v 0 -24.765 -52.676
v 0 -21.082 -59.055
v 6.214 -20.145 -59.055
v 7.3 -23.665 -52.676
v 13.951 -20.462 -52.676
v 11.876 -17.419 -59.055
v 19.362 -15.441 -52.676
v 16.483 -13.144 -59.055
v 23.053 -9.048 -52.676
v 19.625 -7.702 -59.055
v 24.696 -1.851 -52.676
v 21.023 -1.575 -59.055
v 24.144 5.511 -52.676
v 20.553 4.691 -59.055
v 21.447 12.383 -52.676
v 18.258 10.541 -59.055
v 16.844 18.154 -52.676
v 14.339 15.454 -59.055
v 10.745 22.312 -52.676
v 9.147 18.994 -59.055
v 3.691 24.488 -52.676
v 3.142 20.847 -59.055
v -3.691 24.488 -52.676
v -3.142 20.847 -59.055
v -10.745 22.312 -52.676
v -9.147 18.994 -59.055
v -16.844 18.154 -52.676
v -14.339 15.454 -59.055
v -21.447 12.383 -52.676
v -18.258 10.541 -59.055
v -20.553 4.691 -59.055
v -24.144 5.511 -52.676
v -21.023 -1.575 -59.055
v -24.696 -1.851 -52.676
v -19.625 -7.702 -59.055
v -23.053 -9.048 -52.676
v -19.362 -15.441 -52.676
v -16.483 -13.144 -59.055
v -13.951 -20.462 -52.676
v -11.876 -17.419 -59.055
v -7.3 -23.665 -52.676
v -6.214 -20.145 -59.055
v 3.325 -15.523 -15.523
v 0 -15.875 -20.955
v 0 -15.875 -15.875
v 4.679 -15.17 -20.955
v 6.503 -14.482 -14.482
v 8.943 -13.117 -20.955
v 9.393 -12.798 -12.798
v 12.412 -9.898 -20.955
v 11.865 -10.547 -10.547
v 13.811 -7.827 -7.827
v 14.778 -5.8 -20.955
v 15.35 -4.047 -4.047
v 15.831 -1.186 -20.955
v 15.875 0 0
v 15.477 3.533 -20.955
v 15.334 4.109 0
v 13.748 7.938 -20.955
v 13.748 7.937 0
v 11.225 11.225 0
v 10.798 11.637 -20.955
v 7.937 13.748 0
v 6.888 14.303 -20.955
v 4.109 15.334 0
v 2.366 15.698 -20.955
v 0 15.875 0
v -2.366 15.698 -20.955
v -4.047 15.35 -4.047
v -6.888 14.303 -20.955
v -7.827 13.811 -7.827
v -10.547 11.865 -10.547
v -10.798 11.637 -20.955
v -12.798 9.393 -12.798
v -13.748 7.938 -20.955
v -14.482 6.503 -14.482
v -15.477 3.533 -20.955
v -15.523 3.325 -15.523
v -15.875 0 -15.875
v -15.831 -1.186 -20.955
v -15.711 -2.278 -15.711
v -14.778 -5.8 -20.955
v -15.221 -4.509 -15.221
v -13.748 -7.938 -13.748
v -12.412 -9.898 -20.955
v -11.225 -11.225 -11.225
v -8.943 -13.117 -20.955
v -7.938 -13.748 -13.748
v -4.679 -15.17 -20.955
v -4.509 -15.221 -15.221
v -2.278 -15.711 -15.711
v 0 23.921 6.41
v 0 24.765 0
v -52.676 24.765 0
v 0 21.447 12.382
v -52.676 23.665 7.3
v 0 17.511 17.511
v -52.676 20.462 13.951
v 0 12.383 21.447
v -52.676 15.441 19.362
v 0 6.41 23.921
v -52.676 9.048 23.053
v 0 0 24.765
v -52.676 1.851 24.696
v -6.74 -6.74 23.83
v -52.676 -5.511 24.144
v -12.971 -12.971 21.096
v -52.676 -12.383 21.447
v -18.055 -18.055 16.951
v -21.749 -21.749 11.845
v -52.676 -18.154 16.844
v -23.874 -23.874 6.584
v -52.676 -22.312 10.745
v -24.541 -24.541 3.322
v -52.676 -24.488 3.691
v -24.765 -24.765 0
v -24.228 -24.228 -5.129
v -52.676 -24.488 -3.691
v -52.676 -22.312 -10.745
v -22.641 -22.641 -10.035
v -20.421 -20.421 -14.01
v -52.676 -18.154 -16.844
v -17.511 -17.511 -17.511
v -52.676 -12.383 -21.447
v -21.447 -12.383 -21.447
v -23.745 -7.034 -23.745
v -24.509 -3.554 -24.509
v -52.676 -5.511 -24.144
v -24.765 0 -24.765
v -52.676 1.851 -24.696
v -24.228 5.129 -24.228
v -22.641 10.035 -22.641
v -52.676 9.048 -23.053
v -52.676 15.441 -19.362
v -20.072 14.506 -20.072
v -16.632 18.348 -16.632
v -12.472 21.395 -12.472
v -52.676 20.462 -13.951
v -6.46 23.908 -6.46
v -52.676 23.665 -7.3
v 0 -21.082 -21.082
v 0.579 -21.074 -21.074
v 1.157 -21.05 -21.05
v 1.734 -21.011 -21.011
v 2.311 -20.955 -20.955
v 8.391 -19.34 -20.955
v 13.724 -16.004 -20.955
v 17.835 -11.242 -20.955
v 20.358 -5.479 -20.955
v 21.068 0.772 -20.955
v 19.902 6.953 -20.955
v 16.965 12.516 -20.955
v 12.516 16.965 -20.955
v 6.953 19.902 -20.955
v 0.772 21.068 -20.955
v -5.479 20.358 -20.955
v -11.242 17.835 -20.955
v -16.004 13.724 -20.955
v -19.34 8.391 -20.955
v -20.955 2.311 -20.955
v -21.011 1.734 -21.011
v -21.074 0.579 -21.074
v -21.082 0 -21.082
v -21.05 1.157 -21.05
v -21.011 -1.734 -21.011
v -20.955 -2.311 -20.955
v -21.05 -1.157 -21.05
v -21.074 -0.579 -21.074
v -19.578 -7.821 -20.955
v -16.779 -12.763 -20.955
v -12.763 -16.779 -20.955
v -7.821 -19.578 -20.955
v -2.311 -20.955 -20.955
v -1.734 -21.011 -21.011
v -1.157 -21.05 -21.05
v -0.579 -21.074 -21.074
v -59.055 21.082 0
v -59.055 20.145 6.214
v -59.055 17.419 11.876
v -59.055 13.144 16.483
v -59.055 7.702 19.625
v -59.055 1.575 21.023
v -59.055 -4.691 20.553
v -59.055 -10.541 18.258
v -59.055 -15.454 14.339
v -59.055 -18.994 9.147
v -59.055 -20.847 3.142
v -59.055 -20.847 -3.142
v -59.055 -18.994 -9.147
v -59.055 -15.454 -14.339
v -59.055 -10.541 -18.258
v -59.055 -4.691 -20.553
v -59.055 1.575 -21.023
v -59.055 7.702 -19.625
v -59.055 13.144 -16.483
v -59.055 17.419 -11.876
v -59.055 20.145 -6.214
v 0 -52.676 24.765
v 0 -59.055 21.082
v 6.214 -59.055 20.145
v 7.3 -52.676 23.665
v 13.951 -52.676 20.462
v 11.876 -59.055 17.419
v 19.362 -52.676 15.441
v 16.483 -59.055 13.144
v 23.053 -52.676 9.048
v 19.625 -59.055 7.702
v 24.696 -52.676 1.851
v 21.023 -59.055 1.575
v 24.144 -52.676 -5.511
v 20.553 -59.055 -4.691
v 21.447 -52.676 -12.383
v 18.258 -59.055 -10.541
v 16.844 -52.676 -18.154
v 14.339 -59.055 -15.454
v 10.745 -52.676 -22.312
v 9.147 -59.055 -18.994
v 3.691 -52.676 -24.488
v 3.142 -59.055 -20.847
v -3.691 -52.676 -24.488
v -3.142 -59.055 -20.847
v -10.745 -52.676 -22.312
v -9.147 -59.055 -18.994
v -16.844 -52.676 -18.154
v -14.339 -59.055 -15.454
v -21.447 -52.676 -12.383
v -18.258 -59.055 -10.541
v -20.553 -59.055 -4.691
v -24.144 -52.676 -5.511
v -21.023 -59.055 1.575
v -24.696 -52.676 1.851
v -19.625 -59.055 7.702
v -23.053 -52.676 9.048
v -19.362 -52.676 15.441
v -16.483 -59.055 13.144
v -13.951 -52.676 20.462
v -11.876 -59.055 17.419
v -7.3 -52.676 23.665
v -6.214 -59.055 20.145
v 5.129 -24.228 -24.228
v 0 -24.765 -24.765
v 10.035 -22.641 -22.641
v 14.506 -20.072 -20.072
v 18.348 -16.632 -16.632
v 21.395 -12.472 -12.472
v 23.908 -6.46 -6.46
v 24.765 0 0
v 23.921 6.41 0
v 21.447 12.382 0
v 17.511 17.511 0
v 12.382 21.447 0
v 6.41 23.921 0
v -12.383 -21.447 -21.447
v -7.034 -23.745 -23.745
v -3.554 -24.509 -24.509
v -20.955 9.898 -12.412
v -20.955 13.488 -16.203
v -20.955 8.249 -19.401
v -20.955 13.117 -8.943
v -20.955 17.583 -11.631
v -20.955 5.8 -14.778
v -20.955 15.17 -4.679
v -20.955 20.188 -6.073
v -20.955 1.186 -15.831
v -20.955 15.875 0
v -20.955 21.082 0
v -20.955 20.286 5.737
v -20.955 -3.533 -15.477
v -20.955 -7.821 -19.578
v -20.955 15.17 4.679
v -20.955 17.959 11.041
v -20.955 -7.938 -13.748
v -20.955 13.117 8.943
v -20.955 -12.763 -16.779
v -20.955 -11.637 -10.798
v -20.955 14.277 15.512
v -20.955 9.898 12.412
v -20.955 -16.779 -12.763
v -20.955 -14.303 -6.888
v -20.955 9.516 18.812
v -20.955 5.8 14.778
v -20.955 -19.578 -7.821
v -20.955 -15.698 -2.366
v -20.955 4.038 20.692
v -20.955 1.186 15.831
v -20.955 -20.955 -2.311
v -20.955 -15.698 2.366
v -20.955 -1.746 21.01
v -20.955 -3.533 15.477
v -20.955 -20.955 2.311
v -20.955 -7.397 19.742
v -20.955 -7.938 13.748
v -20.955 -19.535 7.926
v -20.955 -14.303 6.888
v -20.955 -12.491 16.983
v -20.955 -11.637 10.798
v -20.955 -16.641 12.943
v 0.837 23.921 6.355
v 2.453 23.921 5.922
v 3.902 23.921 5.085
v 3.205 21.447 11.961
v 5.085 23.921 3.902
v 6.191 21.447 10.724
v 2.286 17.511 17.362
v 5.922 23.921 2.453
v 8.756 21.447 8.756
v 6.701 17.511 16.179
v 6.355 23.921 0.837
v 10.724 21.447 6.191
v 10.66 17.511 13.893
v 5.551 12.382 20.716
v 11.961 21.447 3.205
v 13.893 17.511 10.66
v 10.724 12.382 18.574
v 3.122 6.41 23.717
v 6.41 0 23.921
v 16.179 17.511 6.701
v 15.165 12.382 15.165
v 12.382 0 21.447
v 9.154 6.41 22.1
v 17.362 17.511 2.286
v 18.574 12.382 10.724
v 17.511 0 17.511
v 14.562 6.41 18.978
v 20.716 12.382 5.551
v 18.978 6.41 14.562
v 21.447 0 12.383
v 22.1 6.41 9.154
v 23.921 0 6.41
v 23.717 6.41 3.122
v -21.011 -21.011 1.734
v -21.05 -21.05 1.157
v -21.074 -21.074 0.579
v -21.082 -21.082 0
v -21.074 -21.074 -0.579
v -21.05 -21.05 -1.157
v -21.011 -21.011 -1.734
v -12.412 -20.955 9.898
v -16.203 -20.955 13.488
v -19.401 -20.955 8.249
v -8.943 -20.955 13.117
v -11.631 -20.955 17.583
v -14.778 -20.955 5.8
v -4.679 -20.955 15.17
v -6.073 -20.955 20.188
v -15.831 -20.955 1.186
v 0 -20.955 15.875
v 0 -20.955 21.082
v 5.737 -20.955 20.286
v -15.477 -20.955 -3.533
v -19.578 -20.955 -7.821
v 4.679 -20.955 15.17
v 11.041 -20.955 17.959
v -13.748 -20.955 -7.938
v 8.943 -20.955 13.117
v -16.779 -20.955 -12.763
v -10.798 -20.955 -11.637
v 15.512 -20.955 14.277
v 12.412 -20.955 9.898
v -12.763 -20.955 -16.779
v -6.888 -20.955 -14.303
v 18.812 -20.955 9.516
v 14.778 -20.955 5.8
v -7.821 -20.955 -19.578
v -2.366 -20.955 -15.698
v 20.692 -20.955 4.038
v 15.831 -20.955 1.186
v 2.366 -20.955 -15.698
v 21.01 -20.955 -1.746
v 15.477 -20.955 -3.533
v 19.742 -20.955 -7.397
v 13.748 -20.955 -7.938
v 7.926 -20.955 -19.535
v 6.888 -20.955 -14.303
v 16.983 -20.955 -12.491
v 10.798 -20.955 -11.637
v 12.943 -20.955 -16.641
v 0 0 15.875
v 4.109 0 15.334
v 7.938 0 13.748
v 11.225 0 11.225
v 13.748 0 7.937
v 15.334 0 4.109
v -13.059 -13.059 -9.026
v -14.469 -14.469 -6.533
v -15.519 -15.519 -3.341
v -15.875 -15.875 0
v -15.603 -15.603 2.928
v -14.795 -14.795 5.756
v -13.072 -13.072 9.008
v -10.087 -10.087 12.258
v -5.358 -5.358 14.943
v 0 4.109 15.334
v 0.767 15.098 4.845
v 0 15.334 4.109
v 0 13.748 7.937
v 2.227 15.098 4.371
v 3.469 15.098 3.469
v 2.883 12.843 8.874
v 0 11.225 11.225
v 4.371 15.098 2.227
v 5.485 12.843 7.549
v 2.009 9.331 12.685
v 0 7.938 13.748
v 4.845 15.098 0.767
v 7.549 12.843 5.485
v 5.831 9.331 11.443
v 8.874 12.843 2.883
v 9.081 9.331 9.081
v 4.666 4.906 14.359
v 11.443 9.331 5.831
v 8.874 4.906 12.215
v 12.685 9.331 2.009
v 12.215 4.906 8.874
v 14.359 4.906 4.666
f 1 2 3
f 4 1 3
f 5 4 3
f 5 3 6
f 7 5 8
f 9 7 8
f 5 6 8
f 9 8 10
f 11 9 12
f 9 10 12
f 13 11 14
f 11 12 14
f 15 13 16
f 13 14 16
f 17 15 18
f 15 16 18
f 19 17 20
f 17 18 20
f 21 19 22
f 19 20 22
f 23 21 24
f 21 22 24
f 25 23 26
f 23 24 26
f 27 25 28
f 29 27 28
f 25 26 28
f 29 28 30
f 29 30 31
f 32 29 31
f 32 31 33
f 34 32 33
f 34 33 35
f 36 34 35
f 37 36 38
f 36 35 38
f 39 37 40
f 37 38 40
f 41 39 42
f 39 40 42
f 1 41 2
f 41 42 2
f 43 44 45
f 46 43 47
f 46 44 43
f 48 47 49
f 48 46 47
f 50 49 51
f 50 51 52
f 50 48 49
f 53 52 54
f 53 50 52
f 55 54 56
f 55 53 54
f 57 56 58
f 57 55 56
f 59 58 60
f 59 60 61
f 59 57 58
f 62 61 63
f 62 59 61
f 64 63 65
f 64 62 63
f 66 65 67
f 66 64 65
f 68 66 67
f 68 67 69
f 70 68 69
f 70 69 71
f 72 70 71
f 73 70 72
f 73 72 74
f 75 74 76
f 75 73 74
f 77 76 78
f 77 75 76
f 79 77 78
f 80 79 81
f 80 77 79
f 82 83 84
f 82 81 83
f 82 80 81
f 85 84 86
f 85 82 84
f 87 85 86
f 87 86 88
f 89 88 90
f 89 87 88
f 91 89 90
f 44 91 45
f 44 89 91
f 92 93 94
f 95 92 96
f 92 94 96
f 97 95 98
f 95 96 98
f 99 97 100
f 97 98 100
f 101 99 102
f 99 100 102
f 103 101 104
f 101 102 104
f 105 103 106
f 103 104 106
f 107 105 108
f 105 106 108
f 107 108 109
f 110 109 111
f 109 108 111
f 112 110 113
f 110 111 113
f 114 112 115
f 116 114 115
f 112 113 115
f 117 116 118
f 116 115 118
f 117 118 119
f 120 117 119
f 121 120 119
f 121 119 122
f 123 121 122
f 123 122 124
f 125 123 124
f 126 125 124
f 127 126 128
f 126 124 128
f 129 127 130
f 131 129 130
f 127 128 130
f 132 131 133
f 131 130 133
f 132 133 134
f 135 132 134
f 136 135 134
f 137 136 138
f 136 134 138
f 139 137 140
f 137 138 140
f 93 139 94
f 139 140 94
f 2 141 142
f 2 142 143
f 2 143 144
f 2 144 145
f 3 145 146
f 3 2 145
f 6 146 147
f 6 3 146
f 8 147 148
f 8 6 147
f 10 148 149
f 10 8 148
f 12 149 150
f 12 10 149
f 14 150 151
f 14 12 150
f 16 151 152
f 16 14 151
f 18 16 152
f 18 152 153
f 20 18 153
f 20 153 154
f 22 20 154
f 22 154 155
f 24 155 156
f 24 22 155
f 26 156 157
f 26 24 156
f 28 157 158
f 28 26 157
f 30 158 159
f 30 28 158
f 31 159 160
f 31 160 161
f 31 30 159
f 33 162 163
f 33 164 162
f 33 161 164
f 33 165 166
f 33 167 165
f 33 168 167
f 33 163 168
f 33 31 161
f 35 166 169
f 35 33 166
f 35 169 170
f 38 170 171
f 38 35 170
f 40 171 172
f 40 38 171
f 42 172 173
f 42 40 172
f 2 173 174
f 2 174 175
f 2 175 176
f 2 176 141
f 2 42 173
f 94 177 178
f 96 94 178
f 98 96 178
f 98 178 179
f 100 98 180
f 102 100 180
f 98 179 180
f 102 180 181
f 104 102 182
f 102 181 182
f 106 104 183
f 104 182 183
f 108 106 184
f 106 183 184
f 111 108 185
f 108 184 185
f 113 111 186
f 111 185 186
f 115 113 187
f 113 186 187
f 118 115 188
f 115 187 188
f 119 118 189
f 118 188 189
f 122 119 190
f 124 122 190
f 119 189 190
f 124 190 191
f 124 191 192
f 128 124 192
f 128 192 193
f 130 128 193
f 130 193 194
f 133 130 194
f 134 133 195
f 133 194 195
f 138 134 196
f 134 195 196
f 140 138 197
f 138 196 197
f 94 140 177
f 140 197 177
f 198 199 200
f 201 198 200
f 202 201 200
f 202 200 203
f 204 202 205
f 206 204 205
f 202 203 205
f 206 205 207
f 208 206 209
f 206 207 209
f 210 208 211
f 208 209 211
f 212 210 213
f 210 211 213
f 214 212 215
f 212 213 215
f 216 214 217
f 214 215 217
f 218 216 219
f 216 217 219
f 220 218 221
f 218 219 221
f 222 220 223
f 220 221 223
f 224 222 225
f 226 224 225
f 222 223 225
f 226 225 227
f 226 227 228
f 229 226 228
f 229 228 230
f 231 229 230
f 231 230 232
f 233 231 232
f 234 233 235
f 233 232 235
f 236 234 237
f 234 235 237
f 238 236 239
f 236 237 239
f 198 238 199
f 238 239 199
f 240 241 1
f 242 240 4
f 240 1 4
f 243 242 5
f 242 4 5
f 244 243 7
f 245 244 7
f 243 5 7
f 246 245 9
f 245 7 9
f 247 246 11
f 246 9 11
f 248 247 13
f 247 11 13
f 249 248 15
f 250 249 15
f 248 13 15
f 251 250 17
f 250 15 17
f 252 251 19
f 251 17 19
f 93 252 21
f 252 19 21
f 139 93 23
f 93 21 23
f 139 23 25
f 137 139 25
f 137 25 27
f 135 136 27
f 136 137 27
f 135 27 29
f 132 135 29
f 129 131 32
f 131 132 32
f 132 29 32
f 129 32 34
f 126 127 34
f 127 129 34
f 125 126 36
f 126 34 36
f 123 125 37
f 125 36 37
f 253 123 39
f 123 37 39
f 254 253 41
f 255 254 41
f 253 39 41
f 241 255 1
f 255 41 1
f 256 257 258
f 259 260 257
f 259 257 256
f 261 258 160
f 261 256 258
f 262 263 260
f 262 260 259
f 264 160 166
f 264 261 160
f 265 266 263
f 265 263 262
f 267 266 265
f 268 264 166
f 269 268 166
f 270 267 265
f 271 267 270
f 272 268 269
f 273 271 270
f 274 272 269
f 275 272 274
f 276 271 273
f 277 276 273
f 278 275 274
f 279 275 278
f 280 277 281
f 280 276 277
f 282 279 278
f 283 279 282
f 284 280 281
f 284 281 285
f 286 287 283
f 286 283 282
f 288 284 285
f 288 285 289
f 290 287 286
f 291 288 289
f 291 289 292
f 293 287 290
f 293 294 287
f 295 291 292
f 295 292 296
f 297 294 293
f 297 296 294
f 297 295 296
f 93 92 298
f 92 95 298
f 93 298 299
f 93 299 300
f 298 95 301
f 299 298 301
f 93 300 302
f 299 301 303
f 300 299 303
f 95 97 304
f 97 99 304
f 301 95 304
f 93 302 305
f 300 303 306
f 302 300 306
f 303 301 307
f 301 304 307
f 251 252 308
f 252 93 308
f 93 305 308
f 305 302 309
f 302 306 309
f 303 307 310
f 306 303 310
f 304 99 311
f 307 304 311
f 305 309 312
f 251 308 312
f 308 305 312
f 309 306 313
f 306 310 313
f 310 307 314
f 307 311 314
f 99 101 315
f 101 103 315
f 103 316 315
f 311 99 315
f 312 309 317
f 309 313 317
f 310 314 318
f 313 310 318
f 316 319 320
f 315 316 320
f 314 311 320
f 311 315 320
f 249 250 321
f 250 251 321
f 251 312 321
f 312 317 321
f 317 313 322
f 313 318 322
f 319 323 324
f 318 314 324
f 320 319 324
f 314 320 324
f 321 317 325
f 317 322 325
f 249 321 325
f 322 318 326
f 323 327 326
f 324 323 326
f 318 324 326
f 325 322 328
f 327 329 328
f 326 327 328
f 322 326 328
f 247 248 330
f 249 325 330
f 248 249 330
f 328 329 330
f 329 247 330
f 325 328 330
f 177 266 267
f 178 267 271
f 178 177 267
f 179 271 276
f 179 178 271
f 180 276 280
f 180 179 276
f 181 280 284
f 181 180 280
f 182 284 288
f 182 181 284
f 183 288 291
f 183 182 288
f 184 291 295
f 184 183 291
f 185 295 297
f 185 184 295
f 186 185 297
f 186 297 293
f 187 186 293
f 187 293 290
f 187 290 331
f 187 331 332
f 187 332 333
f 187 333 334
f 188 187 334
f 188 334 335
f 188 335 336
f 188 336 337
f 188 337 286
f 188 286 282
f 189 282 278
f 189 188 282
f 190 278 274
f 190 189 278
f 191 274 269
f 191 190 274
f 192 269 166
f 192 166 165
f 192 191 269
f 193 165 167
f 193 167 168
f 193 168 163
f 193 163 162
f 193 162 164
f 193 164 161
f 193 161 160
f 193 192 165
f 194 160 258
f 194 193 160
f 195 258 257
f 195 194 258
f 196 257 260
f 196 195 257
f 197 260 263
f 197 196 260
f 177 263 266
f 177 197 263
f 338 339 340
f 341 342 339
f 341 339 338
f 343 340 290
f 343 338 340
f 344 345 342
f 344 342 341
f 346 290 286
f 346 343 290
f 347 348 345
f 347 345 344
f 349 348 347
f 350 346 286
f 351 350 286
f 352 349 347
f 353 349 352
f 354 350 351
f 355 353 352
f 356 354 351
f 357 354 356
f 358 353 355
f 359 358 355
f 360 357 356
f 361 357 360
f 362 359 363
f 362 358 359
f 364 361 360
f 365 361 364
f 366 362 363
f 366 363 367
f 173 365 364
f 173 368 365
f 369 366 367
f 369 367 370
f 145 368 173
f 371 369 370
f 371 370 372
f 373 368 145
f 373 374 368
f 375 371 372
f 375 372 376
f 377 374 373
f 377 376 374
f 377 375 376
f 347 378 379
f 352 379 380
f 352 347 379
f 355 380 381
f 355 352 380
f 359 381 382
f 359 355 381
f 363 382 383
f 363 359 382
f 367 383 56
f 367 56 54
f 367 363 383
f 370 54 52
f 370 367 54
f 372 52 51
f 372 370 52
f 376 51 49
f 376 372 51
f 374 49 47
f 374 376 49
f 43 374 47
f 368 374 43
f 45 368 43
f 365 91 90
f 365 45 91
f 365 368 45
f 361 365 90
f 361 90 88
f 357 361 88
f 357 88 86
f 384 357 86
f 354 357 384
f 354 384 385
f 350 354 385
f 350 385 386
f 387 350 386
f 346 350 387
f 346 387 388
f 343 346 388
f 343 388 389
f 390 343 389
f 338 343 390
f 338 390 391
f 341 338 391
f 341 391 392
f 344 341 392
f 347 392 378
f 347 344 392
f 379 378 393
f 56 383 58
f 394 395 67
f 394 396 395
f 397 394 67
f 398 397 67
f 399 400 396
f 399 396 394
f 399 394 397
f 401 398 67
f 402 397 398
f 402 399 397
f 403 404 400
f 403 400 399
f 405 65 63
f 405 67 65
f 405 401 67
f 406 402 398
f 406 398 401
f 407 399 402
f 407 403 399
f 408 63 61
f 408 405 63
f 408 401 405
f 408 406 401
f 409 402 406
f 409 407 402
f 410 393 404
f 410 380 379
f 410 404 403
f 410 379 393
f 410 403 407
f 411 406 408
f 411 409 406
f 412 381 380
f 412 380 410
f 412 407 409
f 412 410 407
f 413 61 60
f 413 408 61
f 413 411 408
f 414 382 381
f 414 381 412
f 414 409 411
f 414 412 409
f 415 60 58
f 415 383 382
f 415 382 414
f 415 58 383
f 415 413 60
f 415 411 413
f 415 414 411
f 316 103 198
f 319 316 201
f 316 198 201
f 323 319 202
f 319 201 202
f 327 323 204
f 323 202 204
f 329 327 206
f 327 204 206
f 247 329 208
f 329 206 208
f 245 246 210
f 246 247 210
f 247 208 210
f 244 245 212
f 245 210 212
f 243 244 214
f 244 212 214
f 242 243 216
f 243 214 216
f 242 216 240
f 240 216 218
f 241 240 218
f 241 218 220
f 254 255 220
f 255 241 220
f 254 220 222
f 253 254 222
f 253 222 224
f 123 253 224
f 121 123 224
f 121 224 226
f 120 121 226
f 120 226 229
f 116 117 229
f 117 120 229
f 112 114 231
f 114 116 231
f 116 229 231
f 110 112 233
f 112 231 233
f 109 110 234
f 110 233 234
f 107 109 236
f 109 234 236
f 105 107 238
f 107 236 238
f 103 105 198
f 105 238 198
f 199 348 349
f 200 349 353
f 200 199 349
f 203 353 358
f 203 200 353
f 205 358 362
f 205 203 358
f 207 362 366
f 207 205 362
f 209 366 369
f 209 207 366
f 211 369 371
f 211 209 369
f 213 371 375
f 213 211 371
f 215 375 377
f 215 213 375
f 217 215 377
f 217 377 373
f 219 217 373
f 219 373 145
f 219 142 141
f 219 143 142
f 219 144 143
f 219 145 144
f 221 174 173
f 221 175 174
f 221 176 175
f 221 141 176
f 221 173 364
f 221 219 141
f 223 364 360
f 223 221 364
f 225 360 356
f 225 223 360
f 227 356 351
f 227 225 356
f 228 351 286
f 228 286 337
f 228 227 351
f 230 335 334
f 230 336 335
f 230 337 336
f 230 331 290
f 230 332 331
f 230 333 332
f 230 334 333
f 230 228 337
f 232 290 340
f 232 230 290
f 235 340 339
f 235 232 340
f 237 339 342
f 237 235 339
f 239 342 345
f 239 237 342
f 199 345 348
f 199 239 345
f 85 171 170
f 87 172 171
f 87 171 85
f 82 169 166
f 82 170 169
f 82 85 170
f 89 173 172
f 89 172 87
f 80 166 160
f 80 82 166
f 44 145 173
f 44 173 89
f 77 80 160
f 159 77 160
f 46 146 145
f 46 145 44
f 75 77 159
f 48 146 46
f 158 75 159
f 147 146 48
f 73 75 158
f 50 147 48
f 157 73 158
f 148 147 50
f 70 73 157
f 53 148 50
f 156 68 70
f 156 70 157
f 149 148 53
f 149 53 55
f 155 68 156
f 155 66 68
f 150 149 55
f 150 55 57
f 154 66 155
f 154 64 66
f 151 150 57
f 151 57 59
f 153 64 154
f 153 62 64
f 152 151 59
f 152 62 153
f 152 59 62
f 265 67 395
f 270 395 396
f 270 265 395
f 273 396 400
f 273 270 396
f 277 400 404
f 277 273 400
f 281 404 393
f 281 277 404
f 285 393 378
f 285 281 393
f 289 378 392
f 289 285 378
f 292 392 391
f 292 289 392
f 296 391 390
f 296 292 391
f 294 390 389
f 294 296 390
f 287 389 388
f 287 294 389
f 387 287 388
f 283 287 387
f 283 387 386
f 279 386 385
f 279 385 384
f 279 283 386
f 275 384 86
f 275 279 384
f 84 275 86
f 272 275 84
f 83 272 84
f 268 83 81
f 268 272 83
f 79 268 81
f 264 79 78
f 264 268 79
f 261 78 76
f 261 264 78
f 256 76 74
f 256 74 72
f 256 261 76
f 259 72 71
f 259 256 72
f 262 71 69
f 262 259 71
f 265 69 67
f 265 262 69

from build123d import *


with BuildPart() as f3:
    # F0 (on Right) → F3 (revolve)
    with BuildSketch(Plane.YZ):
        with BuildLine():
            Line((-52.6758568757, 24.765), (-59.055, 21.082))
            Line((-59.055, 21.082), (-20.955, 21.082))
            Line((-20.955, 21.082), (-20.955, 15.875))
            Line((-20.955, 15.875), (0, 15.875))
            ThreePointArc((0, 15.875), (11.2253201513, 11.2253201513), (15.875, 0))
            Line((15.875, 0), (24.765, 0))
            ThreePointArc((24.765, 0), (17.5114994361, 17.5114994361), (0, 24.765))
            Line((0, 24.765), (-52.6758568757, 24.765))
        make_face()
        with BuildLine():
            Line((-20.955, 21.082), (-59.055, 21.082))
            Line((-59.055, 21.082), (-59.055, 0))
            Line((-59.055, 0), (0, 0))
            Line((0, 0), (10.5189766587, 0))
            Line((10.5189766587, 0), (15.875, 0))
            ThreePointArc((15.875, 0), (11.2253201513, 11.2253201513), (0, 15.875))
            Line((0, 15.875), (-20.955, 15.875))
            Line((-20.955, 15.875), (-20.955, 21.082))
        make_face()
    revolve(axis=Axis((0, -21.59, 0), (0, 1, 0)))

    # F1 (on Right) → F4 (revolve)
    with BuildSketch(Plane.YZ):
        with BuildLine():
            Line((-24.765, -52.6758568757), (-21.082, -59.055))
            Line((-21.082, -59.055), (-21.082, -20.955))
            Line((-21.082, -20.955), (-15.875, -20.955))
            Line((-15.875, -20.955), (-15.875, 0))
            ThreePointArc((-15.875, 0), (-11.2253201513, 11.2253201513), (0, 15.875))
            Line((0, 15.875), (0, 24.765))
            ThreePointArc((0, 24.765), (-17.5114994361, 17.5114994361), (-24.765, 0))
            Line((-24.765, 0), (-24.765, -52.6758568757))
        make_face()
        with BuildLine():
            Line((-21.082, -20.955), (-21.082, -59.055))
            Line((-21.082, -59.055), (0, -59.055))
            Line((0, -59.055), (0, 0))
            Line((0, 0), (0, 15.875))
            ThreePointArc((0, 15.875), (-11.2253201513, 11.2253201513), (-15.875, 0))
            Line((-15.875, 0), (-15.875, -20.955))
            Line((-15.875, -20.955), (-21.082, -20.955))
        make_face()
    revolve(axis=Axis((0, 0, -21.59), (0, 0, 1)))

    # F2 (on Top) → F5 (revolve)
    with BuildSketch(Plane.XY):
        with BuildLine():
            Line((-52.6758568757, 24.765), (-59.055, 21.082))
            Line((-59.055, 21.082), (-20.955, 21.082))
            Line((-20.955, 21.082), (-20.955, 15.875))
            Line((-20.955, 15.875), (0, 15.875))
            ThreePointArc((0, 15.875), (11.2253201513, 11.2253201513), (15.875, 0))
            Line((15.875, 0), (24.765, 0))
            ThreePointArc((24.765, 0), (17.5114994361, 17.5114994361), (0, 24.765))
            Line((0, 24.765), (-52.6758568757, 24.765))
        make_face()
        with BuildLine():
            Line((-20.955, 21.082), (-59.055, 21.082))
            Line((-59.055, 21.082), (-59.055, 0))
            Line((-59.055, 0), (-12.5608257832, 0))
            Line((-12.5608257832, 0), (0, 0))
            Line((0, 0), (15.875, 0))
            ThreePointArc((15.875, 0), (11.2253201513, 11.2253201513), (0, 15.875))
            Line((0, 15.875), (-20.955, 15.875))
            Line((-20.955, 15.875), (-20.955, 21.082))
        make_face()
    revolve(axis=Axis((-21.59, 0, 0), (1, 0, 0)))

    # F0 (on Right) → F6 (revolve, cut)
    with BuildSketch(Plane.YZ):
        with BuildLine():
            Line((-20.955, 21.082), (-59.055, 21.082))
            Line((-59.055, 21.082), (-59.055, 0))
            Line((-59.055, 0), (0, 0))
            Line((0, 0), (10.5189766587, 0))
            Line((10.5189766587, 0), (15.875, 0))
            ThreePointArc((15.875, 0), (11.2253201513, 11.2253201513), (0, 15.875))
            Line((0, 15.875), (-20.955, 15.875))
            Line((-20.955, 15.875), (-20.955, 21.082))
        make_face()
    revolve(axis=Axis((0, -21.59, 0), (0, 1, 0)), mode=Mode.SUBTRACT)

    # F1 (on Right) → F7 (revolve, cut)
    with BuildSketch(Plane.YZ):
        with BuildLine():
            Line((-21.082, -20.955), (-21.082, -59.055))
            Line((-21.082, -59.055), (0, -59.055))
            Line((0, -59.055), (0, 0))
            Line((0, 0), (0, 15.875))
            ThreePointArc((0, 15.875), (-11.2253201513, 11.2253201513), (-15.875, 0))
            Line((-15.875, 0), (-15.875, -20.955))
            Line((-15.875, -20.955), (-21.082, -20.955))
        make_face()
    revolve(axis=Axis((0, 0, -21.59), (0, 0, 1)), mode=Mode.SUBTRACT)

    # F2 (on Top) → F8 (revolve, cut)
    with BuildSketch(Plane.XY):
        with BuildLine():
            Line((-20.955, 21.082), (-59.055, 21.082))
            Line((-59.055, 21.082), (-59.055, 0))
            Line((-59.055, 0), (-12.5608257832, 0))
            Line((-12.5608257832, 0), (0, 0))
            Line((0, 0), (15.875, 0))
            ThreePointArc((15.875, 0), (11.2253201513, 11.2253201513), (0, 15.875))
            Line((0, 15.875), (-20.955, 15.875))
            Line((-20.955, 15.875), (-20.955, 21.082))
        make_face()
    revolve(axis=Axis((-21.59, 0, 0), (1, 0, 0)), mode=Mode.SUBTRACT)


solid = f3.part
